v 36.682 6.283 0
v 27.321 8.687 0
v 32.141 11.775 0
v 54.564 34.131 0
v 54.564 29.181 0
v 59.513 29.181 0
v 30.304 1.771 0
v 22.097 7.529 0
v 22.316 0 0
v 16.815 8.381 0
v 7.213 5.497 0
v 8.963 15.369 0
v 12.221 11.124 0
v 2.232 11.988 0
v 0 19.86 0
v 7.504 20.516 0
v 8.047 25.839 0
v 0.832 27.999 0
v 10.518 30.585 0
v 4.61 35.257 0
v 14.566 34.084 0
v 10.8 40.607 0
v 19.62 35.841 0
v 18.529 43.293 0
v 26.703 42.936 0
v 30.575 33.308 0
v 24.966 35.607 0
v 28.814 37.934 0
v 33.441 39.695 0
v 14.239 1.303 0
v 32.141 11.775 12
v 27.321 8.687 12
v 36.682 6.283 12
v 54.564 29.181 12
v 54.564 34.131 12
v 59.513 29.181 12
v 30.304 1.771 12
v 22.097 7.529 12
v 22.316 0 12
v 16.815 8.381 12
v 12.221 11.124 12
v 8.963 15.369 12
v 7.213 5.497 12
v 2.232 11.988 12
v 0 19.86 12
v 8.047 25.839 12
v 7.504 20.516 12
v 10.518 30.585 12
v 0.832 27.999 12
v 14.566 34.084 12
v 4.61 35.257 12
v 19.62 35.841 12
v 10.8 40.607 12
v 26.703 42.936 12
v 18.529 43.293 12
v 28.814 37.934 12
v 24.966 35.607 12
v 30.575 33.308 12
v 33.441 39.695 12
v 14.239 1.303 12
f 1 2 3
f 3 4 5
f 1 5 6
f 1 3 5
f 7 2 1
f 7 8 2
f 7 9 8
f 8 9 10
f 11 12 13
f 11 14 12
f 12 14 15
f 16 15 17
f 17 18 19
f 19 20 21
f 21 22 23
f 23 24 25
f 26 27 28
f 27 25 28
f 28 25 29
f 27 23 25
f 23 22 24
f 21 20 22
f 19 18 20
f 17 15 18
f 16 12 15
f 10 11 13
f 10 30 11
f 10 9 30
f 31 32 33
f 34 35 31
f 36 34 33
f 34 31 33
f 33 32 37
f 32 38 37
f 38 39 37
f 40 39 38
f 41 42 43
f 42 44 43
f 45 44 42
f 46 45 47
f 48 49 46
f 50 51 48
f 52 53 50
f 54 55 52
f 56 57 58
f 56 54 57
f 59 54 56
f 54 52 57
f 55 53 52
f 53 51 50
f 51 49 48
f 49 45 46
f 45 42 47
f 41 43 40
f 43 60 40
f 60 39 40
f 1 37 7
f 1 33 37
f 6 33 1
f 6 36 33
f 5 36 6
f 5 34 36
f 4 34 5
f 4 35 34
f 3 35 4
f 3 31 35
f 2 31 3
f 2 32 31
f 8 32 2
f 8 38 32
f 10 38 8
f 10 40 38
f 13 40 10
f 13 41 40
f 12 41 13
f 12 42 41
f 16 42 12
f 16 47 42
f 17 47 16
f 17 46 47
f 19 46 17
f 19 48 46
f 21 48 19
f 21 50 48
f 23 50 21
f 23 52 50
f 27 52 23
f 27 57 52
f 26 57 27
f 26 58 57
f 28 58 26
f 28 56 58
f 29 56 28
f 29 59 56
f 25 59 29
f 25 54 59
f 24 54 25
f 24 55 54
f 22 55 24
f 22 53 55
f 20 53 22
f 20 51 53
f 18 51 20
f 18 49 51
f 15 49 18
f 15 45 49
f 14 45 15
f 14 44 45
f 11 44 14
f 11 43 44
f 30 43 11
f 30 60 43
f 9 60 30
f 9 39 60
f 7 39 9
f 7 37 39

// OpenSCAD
$fn = 32;

// ----------------------------------------------------------------------
// Eye lug: ring_tail, 12 mm thick
// ----------------------------------------------------------------------

// --- parameters (mm) ---
profile_height = 12;      // extrusion height
profile_points = 30;      // points of the closed outline

profile = [[28.814, 37.934], [33.441, 39.695], [26.703, 42.936], [18.529, 43.293], [10.8, 40.607], [4.61, 35.257], [0.832, 27.999], [0, 19.86], [2.232, 11.988], [7.213, 5.497], [14.239, 1.303], [22.316, 0], [30.304, 1.771], [36.682, 6.283], [59.513, 29.181], [54.564, 29.181], [54.564, 34.131], [32.141, 11.775], [27.321, 8.687], [22.097, 7.529], [16.815, 8.381], [12.221, 11.124], [8.963, 15.369], [7.504, 20.516], [8.047, 25.839], [10.518, 30.585], [14.566, 34.084], [19.62, 35.841], [24.966, 35.607], [30.575, 33.308]];  // single closed polygon, 30 points, counter clockwise

// --- the one profile operation ---
linear_extrude(height = profile_height) polygon(points = profile);
